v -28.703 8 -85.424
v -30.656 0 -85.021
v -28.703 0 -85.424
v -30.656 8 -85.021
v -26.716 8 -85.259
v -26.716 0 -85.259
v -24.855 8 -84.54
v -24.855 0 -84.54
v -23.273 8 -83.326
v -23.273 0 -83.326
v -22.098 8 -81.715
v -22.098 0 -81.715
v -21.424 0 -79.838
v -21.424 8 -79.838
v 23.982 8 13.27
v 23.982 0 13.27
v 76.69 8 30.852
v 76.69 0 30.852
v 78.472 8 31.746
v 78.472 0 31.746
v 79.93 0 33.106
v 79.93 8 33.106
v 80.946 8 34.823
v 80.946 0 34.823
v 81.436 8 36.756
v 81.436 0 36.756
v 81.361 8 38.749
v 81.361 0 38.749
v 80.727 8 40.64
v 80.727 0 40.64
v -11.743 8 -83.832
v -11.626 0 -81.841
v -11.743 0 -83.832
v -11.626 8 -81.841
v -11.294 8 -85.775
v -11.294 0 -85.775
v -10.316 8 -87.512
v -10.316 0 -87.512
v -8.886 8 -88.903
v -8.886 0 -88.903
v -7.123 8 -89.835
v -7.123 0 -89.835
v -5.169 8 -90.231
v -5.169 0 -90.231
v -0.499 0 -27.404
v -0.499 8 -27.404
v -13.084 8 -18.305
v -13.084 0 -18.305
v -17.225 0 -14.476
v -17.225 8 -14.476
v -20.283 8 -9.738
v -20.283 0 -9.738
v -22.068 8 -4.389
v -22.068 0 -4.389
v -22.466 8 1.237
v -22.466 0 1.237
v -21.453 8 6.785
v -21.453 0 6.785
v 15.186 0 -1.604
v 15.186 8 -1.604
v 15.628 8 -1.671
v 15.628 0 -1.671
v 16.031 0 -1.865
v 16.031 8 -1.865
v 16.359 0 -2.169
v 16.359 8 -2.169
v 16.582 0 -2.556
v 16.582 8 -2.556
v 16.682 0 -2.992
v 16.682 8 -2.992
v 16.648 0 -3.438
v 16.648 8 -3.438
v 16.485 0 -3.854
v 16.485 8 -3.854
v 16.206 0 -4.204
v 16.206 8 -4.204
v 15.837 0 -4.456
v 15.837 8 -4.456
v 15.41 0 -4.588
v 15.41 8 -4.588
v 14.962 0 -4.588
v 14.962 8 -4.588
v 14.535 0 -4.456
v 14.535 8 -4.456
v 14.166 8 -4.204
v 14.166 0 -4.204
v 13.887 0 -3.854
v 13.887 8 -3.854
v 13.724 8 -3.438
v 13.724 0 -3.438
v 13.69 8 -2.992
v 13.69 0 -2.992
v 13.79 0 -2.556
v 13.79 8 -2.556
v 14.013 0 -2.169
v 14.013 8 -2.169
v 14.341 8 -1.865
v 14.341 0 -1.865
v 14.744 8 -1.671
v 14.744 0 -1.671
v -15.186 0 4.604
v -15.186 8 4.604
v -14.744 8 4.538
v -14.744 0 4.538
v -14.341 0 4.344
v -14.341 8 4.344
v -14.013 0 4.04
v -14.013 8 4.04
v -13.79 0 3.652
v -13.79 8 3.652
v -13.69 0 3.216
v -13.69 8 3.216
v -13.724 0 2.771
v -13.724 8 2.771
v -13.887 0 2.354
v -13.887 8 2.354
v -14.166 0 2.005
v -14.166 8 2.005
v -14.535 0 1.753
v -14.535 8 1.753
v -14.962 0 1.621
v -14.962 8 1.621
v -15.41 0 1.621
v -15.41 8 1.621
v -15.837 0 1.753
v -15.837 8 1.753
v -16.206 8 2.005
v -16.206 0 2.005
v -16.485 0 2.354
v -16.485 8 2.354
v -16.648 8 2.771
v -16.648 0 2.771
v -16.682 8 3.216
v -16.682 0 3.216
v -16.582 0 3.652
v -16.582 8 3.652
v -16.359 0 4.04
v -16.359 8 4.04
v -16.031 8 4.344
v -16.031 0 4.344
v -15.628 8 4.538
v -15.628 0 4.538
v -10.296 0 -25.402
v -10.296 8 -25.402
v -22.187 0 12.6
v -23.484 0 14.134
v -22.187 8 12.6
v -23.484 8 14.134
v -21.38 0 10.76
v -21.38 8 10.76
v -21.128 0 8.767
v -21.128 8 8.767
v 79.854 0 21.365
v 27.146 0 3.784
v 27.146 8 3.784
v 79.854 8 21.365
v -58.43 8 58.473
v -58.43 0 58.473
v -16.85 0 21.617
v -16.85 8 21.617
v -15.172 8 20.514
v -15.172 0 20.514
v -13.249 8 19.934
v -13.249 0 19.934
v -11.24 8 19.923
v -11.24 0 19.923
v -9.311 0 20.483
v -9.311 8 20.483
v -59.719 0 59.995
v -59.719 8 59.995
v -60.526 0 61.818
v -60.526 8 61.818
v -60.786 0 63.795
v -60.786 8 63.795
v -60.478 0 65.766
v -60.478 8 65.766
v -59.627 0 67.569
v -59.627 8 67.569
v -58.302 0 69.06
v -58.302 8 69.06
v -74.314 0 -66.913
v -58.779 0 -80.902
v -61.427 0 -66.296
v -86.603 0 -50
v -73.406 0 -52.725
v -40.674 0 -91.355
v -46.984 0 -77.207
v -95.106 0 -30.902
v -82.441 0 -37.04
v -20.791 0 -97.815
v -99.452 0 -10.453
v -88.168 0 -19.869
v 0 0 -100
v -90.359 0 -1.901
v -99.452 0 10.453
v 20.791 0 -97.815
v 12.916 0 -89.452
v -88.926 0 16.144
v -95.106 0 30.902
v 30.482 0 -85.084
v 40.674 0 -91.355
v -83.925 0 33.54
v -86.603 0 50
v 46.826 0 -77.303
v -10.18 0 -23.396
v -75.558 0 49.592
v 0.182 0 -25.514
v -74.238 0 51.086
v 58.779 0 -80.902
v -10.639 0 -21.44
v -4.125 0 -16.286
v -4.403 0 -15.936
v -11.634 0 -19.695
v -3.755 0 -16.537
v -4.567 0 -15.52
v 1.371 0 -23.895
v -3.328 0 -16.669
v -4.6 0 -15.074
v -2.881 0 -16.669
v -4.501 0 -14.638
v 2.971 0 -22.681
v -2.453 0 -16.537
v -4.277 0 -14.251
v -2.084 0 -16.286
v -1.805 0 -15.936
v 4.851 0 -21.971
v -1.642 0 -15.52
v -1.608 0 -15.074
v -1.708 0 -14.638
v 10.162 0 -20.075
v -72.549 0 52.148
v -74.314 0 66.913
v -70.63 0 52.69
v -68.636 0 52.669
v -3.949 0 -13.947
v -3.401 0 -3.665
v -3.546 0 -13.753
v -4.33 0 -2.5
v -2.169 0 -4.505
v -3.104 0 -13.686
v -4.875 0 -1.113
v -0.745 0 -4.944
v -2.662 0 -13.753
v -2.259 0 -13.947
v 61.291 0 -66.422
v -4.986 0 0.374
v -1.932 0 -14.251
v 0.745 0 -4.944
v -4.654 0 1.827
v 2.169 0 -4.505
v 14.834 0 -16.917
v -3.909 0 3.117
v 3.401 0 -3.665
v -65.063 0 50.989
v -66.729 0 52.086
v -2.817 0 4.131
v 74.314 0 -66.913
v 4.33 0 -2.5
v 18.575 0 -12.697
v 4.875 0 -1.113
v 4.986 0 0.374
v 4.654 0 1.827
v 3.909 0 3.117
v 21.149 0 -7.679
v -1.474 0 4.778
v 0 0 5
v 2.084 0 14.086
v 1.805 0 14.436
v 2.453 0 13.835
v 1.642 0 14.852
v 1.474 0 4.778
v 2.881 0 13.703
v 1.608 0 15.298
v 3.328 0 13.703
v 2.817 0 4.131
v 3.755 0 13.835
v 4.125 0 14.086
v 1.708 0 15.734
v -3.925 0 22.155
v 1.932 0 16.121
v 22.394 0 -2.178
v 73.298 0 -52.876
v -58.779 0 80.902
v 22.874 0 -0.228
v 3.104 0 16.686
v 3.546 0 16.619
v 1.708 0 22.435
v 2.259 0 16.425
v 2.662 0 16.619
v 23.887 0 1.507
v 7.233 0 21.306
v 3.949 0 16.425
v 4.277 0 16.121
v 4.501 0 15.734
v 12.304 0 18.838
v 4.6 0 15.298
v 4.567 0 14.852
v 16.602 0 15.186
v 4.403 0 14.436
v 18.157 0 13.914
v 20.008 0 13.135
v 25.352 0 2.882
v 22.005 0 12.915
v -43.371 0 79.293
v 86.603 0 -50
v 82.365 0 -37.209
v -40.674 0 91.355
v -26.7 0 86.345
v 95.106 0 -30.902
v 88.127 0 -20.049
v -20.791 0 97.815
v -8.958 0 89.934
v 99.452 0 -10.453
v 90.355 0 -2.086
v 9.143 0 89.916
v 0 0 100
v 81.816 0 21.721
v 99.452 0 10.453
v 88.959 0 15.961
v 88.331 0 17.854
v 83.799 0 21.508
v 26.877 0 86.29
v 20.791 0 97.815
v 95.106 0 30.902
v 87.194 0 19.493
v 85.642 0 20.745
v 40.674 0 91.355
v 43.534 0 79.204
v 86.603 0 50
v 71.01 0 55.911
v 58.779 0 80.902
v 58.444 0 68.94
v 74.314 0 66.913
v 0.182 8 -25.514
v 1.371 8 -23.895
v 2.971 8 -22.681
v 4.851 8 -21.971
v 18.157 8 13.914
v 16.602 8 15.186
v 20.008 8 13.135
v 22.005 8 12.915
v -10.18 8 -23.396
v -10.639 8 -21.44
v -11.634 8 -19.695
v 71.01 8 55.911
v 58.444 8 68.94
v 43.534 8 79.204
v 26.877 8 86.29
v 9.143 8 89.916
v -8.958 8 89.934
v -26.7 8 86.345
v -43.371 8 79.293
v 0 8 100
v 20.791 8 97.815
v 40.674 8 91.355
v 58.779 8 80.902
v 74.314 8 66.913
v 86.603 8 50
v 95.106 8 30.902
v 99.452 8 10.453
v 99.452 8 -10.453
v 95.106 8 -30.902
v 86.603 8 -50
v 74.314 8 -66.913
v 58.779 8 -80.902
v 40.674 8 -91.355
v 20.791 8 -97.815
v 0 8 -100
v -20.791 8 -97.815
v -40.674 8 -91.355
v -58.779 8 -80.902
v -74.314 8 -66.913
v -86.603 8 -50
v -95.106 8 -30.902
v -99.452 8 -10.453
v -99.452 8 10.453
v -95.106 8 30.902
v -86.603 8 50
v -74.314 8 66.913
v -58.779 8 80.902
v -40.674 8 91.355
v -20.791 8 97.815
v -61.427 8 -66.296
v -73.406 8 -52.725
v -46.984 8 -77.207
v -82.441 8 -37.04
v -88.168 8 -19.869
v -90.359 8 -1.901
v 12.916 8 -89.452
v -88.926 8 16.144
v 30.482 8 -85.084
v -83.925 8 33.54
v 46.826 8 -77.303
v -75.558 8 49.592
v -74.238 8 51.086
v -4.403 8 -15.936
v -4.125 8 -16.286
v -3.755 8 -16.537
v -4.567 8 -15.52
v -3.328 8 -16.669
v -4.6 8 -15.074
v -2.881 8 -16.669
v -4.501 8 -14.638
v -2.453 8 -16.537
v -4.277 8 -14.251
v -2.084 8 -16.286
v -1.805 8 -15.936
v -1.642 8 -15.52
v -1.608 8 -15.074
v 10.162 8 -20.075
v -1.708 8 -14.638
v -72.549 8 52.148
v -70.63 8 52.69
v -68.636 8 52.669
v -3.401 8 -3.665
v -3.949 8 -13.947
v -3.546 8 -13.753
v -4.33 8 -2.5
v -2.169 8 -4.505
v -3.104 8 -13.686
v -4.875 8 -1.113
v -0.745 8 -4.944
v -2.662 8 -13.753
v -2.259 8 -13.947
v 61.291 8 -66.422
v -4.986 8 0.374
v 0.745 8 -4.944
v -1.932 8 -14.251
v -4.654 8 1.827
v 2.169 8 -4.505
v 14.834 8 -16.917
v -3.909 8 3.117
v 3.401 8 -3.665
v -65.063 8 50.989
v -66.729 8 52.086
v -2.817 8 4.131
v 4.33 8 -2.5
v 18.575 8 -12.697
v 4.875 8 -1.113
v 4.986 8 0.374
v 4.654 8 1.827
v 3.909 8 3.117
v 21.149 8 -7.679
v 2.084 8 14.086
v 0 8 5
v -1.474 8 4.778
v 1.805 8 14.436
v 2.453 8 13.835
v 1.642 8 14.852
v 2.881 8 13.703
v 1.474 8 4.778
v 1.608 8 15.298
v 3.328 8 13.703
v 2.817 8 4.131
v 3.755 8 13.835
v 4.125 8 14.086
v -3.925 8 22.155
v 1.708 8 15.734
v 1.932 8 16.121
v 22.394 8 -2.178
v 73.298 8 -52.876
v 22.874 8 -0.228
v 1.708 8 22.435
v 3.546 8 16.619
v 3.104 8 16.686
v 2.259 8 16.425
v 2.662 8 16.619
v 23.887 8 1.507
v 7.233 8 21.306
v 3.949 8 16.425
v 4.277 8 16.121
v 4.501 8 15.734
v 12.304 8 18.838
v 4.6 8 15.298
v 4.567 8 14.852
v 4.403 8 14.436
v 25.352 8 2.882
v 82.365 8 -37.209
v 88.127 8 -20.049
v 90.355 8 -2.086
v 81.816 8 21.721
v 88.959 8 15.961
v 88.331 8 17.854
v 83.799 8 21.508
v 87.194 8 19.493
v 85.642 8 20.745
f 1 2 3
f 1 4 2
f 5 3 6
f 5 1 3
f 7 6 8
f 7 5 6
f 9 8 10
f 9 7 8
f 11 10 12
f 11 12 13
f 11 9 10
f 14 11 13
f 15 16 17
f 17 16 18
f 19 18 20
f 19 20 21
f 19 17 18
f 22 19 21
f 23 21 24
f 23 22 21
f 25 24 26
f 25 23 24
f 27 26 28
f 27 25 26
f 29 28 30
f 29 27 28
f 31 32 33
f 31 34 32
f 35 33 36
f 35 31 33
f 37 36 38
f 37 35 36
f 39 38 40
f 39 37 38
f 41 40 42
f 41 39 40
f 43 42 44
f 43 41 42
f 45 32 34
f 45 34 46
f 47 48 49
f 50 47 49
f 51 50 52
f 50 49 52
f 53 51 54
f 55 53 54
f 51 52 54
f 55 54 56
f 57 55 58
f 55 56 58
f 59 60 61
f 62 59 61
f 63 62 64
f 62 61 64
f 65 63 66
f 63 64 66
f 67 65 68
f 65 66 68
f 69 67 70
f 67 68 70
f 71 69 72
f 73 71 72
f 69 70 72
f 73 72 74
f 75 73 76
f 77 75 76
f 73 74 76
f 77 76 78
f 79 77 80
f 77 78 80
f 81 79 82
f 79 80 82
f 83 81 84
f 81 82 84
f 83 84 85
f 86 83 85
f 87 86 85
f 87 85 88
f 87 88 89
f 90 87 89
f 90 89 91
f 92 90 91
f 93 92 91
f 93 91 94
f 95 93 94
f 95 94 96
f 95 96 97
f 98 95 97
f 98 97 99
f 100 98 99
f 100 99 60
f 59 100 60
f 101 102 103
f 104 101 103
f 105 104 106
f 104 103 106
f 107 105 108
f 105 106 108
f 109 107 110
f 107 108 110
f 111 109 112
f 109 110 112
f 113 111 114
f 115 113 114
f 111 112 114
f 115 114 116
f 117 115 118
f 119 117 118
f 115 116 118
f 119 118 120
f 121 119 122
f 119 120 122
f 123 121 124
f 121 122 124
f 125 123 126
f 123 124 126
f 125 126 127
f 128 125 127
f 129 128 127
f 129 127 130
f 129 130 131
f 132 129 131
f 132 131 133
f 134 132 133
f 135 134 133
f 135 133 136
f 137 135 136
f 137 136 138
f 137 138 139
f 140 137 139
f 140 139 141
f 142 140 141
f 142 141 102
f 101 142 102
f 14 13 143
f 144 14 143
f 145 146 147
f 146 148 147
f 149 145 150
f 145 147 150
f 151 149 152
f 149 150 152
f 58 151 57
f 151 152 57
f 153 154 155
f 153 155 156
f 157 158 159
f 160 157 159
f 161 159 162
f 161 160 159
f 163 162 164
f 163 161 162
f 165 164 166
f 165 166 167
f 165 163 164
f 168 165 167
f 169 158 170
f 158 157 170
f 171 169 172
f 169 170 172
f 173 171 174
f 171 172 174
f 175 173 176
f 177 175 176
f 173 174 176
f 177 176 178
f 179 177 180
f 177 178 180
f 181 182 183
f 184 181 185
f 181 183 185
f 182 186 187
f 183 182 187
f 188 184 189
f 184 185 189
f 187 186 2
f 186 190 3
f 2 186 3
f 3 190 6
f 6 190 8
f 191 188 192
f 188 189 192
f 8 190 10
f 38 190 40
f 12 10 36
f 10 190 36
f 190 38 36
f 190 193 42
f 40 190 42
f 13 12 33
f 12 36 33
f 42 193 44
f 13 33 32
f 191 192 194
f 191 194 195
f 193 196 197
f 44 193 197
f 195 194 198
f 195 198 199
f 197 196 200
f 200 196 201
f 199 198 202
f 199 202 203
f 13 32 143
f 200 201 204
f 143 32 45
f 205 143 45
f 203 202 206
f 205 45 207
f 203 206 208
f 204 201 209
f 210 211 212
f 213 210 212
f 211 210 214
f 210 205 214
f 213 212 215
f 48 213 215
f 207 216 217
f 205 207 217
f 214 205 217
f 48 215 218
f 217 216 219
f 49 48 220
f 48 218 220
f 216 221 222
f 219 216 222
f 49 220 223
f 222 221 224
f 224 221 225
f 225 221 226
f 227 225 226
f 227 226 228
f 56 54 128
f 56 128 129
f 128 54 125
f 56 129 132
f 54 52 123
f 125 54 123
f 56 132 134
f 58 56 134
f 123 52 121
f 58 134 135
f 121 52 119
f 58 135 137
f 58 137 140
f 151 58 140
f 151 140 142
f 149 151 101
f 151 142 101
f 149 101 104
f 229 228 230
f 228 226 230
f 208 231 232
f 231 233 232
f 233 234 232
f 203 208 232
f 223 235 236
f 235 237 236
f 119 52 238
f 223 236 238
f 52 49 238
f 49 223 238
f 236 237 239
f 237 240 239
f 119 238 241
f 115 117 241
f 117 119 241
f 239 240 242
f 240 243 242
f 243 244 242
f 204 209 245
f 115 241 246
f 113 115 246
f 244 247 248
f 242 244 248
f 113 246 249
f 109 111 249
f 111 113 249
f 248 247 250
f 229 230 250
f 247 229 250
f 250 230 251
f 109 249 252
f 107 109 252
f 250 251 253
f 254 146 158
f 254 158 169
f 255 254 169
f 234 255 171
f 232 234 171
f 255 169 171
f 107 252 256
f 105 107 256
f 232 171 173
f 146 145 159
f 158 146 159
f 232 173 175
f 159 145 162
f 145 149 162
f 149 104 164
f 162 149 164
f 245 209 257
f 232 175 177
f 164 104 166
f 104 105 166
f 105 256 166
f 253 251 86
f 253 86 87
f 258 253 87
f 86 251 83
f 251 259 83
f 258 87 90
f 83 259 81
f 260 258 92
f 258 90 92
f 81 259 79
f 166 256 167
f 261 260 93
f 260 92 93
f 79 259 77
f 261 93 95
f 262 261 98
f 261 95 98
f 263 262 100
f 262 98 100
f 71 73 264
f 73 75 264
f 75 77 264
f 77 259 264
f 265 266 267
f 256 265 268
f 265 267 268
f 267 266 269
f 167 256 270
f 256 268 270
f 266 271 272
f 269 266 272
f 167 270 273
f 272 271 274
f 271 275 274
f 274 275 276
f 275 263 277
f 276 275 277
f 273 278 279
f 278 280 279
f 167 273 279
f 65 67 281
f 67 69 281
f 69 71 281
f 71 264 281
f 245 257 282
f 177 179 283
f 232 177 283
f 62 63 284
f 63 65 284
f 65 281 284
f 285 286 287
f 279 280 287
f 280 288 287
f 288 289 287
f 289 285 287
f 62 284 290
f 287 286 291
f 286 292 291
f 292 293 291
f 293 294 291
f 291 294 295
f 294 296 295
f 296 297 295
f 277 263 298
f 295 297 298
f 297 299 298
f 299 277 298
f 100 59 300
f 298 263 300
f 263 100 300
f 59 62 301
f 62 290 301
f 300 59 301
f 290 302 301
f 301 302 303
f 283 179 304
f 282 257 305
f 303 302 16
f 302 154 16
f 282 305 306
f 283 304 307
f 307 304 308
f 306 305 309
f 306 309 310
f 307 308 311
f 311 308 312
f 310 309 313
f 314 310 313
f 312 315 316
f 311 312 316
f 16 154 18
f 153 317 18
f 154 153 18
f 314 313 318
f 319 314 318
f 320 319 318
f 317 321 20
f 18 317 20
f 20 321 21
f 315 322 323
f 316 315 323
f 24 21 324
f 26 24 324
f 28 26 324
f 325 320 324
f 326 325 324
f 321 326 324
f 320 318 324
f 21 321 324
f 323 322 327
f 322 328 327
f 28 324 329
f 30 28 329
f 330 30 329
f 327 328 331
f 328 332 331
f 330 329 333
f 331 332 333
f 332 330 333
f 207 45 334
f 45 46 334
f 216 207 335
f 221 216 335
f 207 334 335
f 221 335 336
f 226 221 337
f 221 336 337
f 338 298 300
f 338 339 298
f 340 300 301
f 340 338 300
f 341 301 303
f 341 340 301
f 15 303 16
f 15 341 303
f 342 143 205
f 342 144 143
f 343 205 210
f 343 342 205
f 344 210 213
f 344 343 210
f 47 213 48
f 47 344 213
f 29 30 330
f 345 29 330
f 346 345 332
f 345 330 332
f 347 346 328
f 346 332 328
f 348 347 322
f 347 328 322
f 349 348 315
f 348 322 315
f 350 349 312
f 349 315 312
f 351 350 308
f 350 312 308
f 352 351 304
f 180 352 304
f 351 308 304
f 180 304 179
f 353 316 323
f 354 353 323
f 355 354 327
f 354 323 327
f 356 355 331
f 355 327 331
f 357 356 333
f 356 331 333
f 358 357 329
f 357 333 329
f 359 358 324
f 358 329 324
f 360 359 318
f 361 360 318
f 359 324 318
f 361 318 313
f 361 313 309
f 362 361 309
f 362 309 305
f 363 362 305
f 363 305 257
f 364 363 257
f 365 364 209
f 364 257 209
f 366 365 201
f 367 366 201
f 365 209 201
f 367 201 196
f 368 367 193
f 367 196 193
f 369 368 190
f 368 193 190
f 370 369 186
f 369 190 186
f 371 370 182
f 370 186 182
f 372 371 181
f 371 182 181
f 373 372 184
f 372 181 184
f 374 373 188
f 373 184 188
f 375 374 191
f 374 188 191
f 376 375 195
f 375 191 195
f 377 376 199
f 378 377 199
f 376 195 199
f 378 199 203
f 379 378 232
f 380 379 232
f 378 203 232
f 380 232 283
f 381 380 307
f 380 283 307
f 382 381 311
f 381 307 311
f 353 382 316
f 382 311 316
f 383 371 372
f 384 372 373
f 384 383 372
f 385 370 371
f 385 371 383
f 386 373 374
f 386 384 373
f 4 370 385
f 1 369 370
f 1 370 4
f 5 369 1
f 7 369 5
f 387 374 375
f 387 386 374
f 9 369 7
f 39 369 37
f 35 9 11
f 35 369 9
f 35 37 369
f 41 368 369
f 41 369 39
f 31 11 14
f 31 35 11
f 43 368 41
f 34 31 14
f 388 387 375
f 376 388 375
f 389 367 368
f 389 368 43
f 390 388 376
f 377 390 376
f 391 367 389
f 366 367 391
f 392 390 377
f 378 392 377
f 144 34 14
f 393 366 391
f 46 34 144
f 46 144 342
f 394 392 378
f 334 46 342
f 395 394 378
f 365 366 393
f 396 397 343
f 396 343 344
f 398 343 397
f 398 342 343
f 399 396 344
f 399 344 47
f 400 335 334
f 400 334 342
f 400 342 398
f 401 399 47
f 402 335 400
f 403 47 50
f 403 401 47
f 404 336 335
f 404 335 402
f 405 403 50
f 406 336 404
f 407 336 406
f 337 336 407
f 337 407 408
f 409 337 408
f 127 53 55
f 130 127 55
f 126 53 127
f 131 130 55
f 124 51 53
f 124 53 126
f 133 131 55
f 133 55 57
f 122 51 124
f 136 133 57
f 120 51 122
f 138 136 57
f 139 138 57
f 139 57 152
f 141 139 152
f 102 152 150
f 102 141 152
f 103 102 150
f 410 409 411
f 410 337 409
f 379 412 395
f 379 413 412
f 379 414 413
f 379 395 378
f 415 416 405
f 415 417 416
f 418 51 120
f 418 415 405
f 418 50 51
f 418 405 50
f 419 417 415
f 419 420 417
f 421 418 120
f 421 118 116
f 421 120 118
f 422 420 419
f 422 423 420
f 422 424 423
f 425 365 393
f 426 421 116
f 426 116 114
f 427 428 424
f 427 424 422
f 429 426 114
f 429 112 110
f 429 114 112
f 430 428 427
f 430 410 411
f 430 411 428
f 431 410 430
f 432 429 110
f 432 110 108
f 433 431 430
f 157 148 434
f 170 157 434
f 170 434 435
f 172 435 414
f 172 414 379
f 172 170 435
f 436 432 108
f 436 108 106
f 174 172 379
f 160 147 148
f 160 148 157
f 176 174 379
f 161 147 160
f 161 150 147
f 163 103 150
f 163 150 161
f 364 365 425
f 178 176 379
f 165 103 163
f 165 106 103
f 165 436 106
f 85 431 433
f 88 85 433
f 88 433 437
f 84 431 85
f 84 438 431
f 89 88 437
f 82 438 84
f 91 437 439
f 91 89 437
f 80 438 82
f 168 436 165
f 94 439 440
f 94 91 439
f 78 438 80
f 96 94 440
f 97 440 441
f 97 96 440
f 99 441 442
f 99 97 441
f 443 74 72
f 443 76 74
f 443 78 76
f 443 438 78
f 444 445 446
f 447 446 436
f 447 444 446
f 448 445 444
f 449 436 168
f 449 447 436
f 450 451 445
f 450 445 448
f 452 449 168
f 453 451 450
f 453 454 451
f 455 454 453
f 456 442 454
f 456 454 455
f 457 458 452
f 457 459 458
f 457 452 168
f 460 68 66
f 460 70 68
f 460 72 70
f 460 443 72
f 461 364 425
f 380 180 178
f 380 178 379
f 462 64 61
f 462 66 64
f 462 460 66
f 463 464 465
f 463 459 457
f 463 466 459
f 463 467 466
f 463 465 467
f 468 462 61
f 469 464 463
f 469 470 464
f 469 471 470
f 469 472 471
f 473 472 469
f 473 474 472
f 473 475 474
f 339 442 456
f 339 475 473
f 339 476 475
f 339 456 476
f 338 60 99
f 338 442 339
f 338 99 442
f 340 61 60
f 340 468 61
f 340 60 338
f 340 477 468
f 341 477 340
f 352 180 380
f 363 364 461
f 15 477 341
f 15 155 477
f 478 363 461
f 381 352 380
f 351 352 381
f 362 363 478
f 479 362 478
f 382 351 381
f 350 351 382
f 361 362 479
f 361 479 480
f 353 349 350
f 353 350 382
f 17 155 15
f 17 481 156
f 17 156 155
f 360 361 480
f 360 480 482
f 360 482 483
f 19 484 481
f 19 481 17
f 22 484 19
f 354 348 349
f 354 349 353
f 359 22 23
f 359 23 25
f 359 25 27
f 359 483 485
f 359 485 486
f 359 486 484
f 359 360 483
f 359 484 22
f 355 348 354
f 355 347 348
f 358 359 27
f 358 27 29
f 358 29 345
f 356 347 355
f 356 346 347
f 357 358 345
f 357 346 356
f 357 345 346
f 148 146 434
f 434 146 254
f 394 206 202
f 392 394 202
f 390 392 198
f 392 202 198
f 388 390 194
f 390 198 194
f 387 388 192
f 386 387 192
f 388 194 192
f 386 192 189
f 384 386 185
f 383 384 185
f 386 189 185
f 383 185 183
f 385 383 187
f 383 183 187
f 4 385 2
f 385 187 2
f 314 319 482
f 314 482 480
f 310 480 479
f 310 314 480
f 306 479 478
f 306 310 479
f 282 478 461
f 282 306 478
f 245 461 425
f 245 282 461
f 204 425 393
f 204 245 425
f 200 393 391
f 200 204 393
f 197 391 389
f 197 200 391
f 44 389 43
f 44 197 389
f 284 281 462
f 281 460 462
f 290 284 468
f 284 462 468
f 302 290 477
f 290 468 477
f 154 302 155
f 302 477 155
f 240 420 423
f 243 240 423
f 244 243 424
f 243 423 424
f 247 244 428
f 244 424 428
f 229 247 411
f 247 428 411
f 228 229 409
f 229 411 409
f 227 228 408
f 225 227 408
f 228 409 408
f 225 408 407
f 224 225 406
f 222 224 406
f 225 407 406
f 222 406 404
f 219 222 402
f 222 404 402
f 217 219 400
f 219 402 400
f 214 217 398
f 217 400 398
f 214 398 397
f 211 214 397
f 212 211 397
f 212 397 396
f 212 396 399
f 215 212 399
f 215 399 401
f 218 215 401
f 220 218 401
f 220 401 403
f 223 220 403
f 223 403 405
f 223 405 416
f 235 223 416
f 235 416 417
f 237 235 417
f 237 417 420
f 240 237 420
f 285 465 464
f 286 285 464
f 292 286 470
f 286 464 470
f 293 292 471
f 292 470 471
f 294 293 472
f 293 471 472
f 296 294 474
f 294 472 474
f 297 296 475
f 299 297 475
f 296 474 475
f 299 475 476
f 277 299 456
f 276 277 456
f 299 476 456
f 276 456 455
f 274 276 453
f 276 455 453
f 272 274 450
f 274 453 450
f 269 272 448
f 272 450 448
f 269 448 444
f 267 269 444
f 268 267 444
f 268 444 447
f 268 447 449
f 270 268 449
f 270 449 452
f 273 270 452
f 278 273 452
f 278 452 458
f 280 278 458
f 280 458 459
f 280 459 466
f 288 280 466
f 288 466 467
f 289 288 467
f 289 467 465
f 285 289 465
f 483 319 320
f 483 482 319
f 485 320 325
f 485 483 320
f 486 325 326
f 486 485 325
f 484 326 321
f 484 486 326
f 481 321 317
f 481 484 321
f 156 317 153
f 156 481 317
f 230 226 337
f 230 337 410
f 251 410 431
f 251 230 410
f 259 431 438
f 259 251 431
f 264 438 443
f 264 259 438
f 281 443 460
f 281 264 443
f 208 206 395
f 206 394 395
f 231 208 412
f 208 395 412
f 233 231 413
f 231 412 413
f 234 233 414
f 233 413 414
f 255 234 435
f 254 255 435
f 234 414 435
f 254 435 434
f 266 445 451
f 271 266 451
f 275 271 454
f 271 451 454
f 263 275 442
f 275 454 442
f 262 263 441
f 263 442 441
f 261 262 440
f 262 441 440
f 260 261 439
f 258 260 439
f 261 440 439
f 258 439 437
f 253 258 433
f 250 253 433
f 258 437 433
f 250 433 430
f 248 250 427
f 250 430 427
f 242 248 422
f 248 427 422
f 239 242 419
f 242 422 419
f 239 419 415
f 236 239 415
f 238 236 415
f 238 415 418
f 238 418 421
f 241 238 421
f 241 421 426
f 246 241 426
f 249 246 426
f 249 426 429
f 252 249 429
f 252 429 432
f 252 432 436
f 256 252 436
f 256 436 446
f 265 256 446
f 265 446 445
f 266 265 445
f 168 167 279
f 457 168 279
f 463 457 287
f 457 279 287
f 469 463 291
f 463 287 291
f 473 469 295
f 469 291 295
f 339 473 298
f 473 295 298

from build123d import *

# Parameters (mm, degrees)
SKETCH_1_R          = 100
EXTRUDE_2_DEPTH     = 8
SKETCH_3_R          = 5
SKETCH_3_R_2        = 1.5
CUT_EXTRUDE_1_DEPTH = 142.647449677
FILLET_1_R          = 7
FILLET_2_R          = 7


with BuildPart() as part:
    # 草图1 → 凸台-拉伸2 (new body)
    with BuildSketch(Plane(origin=(0, 0, 0), x_dir=(1, 0, 0), z_dir=(0, 1, 0))):
        with Locations(Location((0, 0, 0), (0, 0, 270))):
            Circle(SKETCH_1_R)
        with BuildLine():
            Line((-22.971939134, 87.411215106), (-9.292268133, 20.49155321))
            ThreePointArc((-9.292268133, 20.49155321), (-21.343901201, 7.119542226), (-19.733222484, -10.809714631))
            Line((-19.733222484, -10.809714631), (-70.847514199, -56.116488181))
            ThreePointArc((-70.847514199, -56.116488181), (-85.735481912, 28.5982107), (-22.971939134, 87.411215106))
        make_face(mode=Mode.SUBTRACT)
        with BuildLine():
            Line((-13.174547237, 89.413991181), (0.505123764, 22.494329285))
            ThreePointArc((0.505123764, 22.494329285), (16.837655032, 14.924589543), (22.392339709, -2.198436343))
            Line((22.392339709, -2.198436343), (87.186302424, -23.811324689))
            ThreePointArc((87.186302424, -23.811324689), (67.634517925, 59.949999991), (-13.174547237, 89.413991181))
        make_face(mode=Mode.SUBTRACT)
        with BuildLine():
            Line((19.22809872, -11.684614654), (84.022061435, -33.297503))
            ThreePointArc((84.022061435, -33.297503), (18.100963986, -88.548210691), (-64.21436329, -63.599890417))
            Line((-64.21436329, -63.599890417), (-13.100071576, -18.293116867))
            ThreePointArc((-13.100071576, -18.293116867), (4.50624617, -22.044131769), (19.22809872, -11.684614654))
        make_face(mode=Mode.SUBTRACT)
    extrude(amount=EXTRUDE_2_DEPTH)

    # 草图3 → 切除-拉伸1 (cut, through all)
    with BuildSketch(Plane(origin=(0, 8, 0), x_dir=(1, 0, 0), z_dir=(0, 1, 0))):
        with Locations(Location((0, 0, 0), (0, 0, 270))):
            Circle(SKETCH_3_R)
        with Locations(Location((-3.104302917, 15.185957441, 0), (0, 0, 270))):
            Circle(SKETCH_3_R_2)
        with Locations(Location((15.185957441, 3.104302917, 0), (0, 0, 270))):
            Circle(SKETCH_3_R_2)
        with Locations(Location((3.104302917, -15.185957441, 0), (0, 0, 270))):
            Circle(SKETCH_3_R_2)
        with Locations(Location((-15.185957441, -3.104302917, 0), (0, 0, 270))):
            Circle(SKETCH_3_R_2)
    extrude(amount=-CUT_EXTRUDE_1_DEPTH, mode=Mode.SUBTRACT)

    # 圆角1
    fillet_1_edges = [part.edges().sort_by_distance(p)[0] for p in [
        (87.186302424, 4, 23.811324689),
        (-13.174547237, 4, -89.413991181),
        (-64.21436329, 4, 63.599890417),
        (84.022061435, 4, 33.297503),
        (-22.971939134, 4, -87.411215106),
        (-70.847514199, 4, 56.116488181),
    ]]
    fillet(fillet_1_edges, radius=FILLET_1_R)

    # 圆角2
    fillet_2_edges = [part.edges().sort_by_distance(p)[0] for p in [
        (0.505123764, 4, -22.494329285),
        (22.392339709, 4, 2.198436343),
        (19.22809872, 4, 11.684614654),
        (-13.100071576, 4, 18.293116867),
        (-19.733222484, 4, 10.809714631),
        (-9.292268133, 4, -20.49155321),
    ]]
    fillet(fillet_2_edges, radius=FILLET_2_R)


solid = part.part
